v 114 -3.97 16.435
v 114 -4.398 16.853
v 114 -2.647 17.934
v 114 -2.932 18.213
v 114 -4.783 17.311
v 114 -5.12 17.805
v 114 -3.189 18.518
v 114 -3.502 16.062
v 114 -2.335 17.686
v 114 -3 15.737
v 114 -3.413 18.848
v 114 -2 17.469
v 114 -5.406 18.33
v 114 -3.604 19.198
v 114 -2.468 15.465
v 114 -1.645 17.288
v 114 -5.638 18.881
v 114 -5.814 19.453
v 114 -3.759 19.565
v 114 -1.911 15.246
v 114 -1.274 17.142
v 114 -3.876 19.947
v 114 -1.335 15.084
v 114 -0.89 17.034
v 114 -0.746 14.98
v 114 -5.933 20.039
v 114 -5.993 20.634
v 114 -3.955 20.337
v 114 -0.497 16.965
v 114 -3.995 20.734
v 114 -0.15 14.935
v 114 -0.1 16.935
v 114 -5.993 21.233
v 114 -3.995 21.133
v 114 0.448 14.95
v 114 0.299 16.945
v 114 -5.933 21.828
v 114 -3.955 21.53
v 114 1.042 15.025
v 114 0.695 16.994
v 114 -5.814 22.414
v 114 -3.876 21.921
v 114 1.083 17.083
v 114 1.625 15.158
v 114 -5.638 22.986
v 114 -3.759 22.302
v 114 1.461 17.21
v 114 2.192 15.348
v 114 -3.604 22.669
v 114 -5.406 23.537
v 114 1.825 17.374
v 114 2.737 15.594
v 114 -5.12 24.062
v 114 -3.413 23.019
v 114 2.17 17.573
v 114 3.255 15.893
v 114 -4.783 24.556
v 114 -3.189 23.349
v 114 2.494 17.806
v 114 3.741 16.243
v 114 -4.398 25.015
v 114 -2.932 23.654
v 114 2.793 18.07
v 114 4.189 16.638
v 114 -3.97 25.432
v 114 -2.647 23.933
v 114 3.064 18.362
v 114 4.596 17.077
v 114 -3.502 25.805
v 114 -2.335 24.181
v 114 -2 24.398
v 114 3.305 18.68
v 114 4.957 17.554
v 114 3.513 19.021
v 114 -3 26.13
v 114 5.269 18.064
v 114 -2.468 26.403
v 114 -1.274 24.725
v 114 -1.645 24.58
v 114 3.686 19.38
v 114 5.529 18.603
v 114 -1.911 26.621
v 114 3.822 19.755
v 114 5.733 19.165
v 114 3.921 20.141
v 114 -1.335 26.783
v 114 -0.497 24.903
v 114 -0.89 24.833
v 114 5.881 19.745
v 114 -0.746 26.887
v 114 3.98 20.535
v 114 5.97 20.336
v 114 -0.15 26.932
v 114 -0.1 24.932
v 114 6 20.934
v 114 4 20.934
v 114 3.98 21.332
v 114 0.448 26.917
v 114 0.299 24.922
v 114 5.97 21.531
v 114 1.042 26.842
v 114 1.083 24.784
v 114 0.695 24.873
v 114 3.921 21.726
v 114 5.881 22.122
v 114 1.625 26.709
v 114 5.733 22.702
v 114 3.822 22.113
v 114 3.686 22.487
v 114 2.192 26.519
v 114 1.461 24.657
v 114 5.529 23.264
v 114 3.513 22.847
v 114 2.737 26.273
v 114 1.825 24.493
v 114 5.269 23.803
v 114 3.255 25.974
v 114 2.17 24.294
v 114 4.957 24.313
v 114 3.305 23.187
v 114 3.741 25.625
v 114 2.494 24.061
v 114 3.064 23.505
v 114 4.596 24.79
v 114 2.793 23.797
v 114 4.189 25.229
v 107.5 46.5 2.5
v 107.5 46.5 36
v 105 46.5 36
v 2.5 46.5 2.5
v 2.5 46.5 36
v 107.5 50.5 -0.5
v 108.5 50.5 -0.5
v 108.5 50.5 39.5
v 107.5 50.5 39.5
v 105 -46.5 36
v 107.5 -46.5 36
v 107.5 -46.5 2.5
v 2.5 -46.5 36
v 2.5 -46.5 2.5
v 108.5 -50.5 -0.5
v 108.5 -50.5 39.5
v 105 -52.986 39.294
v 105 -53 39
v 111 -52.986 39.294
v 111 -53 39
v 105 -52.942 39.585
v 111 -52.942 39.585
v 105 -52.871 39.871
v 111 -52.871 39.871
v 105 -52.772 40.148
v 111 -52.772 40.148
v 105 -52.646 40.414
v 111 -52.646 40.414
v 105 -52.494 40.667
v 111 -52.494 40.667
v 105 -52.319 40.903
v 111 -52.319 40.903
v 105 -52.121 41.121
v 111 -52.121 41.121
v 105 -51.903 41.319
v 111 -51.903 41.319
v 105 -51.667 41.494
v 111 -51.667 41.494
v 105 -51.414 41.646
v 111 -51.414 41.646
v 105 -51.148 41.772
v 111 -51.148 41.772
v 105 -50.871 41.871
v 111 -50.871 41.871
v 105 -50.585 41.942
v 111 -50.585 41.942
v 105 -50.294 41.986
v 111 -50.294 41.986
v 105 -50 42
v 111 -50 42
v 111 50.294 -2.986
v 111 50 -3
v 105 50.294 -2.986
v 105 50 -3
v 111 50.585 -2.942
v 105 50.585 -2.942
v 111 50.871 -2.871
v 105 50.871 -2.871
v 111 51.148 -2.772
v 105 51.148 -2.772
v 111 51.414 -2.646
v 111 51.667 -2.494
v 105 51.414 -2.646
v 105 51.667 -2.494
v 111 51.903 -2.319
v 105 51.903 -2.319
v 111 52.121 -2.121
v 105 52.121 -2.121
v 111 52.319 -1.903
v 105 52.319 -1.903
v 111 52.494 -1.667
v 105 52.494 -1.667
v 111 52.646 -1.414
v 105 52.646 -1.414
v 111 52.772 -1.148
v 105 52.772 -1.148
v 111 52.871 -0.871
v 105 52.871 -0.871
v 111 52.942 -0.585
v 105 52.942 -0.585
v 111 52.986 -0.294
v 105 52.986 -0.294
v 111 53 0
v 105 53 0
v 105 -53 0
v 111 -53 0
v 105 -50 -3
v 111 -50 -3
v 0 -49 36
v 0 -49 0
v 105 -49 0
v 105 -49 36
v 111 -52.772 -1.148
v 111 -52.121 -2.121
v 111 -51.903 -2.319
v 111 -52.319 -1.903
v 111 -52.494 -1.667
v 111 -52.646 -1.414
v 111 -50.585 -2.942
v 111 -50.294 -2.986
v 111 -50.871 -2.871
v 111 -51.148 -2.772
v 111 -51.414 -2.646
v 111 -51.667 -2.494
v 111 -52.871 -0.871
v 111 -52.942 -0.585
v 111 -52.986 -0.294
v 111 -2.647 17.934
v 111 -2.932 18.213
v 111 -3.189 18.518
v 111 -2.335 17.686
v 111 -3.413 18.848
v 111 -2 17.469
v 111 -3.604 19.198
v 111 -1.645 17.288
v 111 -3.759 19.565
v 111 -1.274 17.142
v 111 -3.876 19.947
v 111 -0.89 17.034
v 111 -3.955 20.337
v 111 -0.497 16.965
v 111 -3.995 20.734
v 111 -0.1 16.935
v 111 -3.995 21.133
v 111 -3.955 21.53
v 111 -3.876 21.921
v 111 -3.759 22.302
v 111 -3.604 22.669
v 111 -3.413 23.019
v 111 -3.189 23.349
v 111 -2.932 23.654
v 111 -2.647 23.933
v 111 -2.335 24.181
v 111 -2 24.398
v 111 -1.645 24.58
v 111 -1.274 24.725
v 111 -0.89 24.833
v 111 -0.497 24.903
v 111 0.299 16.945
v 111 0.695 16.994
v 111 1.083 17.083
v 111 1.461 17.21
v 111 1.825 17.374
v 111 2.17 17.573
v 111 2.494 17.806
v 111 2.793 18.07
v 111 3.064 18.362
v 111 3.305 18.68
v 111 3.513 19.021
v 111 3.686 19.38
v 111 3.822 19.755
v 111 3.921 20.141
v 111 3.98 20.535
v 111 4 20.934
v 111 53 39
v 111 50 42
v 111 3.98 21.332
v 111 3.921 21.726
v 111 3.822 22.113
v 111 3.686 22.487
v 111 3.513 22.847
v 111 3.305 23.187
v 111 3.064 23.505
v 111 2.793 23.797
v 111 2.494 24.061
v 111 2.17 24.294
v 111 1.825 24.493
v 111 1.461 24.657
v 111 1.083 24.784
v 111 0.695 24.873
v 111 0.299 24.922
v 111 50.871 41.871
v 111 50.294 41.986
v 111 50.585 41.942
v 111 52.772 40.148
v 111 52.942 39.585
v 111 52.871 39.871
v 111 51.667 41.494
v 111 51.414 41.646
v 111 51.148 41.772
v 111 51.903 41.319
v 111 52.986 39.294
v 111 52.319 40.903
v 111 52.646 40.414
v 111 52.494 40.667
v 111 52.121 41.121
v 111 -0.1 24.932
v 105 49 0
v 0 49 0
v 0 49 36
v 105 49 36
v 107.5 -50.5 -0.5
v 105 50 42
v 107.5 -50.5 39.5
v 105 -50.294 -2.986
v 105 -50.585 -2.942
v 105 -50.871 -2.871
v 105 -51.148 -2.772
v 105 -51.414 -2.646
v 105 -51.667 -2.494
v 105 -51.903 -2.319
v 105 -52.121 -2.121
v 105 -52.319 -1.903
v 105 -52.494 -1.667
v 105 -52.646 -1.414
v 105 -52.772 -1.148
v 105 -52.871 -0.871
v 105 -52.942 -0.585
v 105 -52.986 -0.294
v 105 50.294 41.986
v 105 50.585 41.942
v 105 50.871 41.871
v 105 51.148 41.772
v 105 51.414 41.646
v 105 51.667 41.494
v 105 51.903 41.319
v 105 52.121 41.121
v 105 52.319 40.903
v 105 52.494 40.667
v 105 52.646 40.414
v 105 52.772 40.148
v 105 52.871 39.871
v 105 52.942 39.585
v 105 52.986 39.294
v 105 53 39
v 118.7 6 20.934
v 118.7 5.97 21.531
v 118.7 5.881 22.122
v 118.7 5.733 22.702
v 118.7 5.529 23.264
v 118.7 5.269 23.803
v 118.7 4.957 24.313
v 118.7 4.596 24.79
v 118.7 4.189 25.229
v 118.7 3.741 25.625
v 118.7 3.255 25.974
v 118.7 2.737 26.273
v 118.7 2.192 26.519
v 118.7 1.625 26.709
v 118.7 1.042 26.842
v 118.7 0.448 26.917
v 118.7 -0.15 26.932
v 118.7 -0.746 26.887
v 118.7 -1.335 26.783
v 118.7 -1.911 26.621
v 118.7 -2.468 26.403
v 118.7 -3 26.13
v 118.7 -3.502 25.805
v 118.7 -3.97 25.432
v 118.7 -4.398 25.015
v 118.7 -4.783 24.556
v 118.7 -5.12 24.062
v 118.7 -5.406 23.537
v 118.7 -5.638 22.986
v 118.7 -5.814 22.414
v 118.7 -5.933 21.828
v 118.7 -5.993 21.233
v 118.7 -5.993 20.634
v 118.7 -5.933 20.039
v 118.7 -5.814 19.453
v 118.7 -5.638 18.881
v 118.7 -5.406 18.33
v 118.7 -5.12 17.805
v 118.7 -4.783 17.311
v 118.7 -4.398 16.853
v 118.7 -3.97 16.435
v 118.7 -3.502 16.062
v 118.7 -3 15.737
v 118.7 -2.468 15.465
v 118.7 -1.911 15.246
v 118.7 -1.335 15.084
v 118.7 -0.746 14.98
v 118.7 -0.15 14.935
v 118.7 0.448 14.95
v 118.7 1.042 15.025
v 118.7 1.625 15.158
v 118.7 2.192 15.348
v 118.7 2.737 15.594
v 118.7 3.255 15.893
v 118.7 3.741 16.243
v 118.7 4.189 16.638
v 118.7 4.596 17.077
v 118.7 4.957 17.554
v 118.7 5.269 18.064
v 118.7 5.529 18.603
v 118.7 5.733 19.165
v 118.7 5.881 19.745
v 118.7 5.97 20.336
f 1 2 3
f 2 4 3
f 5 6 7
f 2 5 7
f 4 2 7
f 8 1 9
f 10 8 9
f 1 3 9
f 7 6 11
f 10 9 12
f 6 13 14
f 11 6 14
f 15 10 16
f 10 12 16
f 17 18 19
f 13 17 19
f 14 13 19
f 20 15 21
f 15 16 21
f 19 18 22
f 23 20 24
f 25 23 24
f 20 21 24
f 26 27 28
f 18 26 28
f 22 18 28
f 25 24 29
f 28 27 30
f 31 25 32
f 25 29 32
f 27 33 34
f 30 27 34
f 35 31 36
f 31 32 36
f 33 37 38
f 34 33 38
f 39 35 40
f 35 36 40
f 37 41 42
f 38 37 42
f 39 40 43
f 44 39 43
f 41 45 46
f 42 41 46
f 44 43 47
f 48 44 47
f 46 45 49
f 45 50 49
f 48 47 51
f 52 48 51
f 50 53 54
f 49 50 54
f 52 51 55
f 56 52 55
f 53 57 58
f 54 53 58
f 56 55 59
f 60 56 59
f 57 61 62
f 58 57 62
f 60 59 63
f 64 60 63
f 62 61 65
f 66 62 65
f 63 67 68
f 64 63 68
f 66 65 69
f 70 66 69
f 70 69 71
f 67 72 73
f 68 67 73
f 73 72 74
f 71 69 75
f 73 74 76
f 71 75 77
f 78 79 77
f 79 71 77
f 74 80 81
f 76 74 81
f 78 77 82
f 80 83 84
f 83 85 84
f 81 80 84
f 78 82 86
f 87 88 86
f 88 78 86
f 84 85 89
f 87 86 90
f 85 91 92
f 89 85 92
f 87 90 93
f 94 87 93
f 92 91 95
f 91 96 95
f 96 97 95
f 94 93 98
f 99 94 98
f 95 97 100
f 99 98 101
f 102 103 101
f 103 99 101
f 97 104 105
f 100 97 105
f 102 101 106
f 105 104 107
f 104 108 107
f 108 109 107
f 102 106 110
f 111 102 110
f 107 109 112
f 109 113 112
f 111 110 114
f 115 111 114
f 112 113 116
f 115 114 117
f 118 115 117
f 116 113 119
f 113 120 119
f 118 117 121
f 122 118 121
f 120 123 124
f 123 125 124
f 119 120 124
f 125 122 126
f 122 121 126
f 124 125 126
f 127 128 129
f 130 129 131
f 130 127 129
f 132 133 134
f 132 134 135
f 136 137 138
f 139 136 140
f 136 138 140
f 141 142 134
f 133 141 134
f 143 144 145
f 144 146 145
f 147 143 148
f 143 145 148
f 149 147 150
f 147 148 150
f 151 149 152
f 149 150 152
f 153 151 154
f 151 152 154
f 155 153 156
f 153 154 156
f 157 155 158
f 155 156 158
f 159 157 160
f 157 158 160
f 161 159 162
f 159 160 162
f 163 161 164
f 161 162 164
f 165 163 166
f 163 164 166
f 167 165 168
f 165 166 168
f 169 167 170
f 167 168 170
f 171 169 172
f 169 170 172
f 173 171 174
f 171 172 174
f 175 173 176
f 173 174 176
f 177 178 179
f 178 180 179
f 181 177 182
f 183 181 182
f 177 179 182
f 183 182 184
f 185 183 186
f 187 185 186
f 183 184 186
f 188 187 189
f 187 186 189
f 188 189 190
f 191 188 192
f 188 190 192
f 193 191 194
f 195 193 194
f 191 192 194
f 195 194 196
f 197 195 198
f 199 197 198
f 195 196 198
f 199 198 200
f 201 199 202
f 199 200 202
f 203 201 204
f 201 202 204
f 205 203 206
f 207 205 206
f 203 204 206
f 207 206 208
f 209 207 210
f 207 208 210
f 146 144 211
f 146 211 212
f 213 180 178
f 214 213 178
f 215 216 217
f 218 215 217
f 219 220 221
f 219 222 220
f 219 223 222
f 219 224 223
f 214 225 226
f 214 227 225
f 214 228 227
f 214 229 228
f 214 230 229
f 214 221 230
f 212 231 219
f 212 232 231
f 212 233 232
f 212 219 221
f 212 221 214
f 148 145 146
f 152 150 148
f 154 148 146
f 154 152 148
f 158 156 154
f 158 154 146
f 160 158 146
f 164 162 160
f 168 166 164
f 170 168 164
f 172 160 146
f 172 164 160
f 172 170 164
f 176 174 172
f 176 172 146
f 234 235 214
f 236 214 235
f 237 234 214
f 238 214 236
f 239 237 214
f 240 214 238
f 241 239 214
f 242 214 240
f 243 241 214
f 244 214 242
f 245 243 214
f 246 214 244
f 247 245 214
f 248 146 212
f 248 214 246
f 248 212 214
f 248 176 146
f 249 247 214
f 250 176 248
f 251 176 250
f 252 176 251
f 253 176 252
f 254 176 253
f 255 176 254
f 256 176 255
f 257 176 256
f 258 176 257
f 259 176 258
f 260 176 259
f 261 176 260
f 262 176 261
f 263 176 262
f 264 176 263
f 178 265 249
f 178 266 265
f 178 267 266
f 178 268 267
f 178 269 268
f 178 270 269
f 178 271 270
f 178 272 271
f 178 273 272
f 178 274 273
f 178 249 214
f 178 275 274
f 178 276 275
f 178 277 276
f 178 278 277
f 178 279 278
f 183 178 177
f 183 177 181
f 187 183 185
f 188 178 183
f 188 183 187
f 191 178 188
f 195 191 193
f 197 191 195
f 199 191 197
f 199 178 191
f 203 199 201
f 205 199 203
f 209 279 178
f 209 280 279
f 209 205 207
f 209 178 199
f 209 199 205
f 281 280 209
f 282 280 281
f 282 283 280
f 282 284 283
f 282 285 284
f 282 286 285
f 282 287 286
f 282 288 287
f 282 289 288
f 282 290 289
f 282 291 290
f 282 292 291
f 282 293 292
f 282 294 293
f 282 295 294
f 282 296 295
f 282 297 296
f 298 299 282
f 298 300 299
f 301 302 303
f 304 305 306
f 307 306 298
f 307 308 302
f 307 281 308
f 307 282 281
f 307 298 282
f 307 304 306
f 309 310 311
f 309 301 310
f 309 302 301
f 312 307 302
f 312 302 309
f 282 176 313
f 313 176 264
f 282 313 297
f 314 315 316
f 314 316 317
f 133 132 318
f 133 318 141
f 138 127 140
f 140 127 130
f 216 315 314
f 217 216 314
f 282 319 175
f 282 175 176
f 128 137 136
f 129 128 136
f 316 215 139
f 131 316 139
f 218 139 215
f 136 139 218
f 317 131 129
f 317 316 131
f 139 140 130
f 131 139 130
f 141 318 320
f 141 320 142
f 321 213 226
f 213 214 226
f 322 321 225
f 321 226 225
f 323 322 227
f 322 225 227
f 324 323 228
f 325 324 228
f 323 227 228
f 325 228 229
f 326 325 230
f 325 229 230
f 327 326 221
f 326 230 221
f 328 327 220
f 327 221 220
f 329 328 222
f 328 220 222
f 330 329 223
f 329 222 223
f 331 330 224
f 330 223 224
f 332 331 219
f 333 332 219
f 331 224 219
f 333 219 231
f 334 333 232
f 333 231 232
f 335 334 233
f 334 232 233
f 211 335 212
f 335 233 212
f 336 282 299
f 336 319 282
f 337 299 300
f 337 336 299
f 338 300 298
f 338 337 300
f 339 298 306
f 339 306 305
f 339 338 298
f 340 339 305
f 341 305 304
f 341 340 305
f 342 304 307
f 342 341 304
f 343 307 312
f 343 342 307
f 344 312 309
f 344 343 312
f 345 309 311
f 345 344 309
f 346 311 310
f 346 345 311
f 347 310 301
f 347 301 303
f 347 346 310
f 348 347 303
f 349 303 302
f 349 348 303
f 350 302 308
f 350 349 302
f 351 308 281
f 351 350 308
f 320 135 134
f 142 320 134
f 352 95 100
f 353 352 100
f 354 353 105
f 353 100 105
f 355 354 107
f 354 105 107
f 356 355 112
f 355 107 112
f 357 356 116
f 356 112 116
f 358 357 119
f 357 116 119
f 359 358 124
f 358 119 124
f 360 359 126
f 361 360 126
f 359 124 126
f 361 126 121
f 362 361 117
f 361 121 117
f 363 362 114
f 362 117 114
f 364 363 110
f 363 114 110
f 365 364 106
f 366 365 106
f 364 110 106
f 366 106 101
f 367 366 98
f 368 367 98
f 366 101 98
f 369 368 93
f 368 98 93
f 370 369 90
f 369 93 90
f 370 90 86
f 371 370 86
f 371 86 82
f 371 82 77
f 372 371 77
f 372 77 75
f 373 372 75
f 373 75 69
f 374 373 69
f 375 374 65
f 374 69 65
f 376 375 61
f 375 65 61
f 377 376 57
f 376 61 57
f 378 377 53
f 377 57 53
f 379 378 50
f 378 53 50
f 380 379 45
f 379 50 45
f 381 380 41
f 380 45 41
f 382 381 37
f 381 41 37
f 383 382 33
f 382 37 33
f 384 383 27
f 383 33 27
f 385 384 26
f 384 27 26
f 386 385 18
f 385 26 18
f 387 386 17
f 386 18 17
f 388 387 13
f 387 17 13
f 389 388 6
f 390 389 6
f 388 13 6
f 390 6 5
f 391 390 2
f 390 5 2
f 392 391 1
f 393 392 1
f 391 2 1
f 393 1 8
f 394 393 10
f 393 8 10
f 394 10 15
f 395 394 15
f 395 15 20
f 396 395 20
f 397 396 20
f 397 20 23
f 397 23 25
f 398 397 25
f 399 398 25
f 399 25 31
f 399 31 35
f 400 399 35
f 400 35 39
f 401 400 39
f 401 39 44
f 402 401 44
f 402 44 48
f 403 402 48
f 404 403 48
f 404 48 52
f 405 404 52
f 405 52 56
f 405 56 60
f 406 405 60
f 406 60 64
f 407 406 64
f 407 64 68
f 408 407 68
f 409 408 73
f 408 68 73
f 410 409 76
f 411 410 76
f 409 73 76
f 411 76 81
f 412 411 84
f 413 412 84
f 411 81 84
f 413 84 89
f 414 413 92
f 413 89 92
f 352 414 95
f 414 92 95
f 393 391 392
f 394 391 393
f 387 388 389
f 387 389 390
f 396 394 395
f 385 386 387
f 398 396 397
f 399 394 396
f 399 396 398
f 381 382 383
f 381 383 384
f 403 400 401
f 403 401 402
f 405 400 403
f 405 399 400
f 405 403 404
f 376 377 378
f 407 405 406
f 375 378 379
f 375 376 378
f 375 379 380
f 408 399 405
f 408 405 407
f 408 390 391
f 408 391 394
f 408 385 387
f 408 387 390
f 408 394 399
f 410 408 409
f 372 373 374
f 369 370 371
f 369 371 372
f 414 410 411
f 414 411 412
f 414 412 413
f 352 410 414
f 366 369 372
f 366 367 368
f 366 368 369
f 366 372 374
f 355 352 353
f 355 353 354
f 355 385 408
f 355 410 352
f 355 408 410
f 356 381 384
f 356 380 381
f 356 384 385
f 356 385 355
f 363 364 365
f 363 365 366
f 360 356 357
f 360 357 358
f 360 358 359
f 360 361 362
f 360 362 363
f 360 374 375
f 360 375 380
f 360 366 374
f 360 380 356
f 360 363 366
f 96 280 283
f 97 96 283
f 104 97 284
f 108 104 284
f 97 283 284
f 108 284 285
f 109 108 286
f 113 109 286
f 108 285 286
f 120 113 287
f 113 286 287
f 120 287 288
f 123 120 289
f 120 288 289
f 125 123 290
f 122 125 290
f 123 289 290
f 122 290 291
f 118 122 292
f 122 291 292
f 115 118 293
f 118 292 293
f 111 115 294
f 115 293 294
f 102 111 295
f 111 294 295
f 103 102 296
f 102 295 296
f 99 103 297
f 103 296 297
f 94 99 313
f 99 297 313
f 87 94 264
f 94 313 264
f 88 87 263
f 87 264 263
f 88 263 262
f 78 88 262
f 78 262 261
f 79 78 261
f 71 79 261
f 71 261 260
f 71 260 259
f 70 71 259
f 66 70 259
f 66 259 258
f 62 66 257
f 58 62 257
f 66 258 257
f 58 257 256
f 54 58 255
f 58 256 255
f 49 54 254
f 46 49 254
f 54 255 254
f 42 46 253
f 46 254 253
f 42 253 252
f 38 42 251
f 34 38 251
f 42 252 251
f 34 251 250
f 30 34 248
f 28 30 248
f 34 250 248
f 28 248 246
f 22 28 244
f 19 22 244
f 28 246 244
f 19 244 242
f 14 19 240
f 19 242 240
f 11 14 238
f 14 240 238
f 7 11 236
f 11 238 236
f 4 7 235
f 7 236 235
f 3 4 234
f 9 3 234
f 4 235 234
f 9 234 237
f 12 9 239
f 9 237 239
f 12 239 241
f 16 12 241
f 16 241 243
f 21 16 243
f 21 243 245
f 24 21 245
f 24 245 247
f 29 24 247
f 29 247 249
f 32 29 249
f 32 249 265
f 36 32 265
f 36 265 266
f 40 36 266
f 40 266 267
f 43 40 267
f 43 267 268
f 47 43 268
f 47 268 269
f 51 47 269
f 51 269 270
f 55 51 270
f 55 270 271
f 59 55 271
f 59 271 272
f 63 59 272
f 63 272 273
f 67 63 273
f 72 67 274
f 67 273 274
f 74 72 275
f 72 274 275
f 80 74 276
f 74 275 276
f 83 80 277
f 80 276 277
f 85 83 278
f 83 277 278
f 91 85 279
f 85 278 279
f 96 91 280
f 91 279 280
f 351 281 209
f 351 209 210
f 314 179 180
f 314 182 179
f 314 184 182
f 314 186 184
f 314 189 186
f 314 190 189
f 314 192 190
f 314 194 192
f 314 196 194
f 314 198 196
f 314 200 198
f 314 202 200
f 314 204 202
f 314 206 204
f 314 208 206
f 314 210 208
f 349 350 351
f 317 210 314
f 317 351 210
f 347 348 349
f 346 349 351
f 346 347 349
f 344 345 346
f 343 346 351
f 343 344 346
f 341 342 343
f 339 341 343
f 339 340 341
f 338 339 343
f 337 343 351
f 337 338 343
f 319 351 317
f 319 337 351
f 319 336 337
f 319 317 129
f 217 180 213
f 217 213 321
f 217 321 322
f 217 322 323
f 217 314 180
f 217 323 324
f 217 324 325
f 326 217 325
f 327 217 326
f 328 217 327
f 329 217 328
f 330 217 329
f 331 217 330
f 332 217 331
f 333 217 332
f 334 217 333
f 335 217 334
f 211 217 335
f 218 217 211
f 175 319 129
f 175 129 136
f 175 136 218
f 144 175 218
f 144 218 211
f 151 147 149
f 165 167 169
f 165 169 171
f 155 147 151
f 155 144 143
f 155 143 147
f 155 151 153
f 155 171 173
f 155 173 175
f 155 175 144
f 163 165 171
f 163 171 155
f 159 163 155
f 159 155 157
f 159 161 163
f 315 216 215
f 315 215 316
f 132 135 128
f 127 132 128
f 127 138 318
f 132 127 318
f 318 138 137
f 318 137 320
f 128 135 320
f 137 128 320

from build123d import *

# Parameters (mm, degrees)
F0_W        = 105
F0_H        = 98
F1_DEPTH    = 36
F2_DEPTH    = 42
F3_DEPTH    = 3
F4_T        = 2.5
F4_T3_DEPTH = 41
F4_T5_DEPTH = 103
F5_R        = 3
F6_R        = 4
F7_DEPTH    = 3
F8_R        = 6
F9_DEPTH    = 4.7


# Not quite as in the source:
# - a shell that OpenCascade refuses in one call is made with other operations: the cavity is built on its own and cut out


with BuildPart() as f1:
    # F0 (on Top) → F1 (new body)
    with BuildSketch(Plane.XY):
        with Locations((52.5, 0)):
            Rectangle(F0_W, F0_H)
    extrude(amount=F1_DEPTH)

    # F0 (on Top) → F2 (join)
    with BuildSketch(Plane.XY):
        Polygon((105, 53), (105, 49), (105, -49), (105, -53), (111, -53), (111, 53), align=None)
    extrude(amount=F2_DEPTH)

    # F0 (on Top) → F3 (join)
    with BuildSketch(Plane.XY):
        Polygon((105, 53), (105, 49), (105, -49), (105, -53), (111, -53), (111, 53), align=None)
    extrude(amount=-F3_DEPTH)

    # F4: shell of thickness 2.5, made by hand


with BuildPart() as f4_core1:
    # F4_t2: copy of F1
    add(f1.part)

    # the walls: a layer under each face that stays
    f4_faces = [f4_core1.faces().sort_by_distance(p)[0] for p in [
        (105, 45.4285714286, 38.7857142857),
        (108, 0, 42),
        (111, 0, 19.5),
        (108, 53, 19.5),
        (108, 0, -3),
        (108, -53, 19.5),
        (0, 0, 18),
        (52.5, -49, 18),
        (52.5, 0, 0),
        (52.5, 49, 18),
    ]]
    thicken(f4_faces, amount=-F4_T, mode=Mode.SUBTRACT)

    # F4_s4 → F4_t3 (cut)
    with BuildSketch(Plane.XY.offset(-2.5)):
        Polygon((104.975, 49.025), (107.5, 49), (107.5, 46.5), (105, 46.5), align=None)
        Polygon((104.975, -49.025), (107.5, -49), (107.5, -46.5), (105, -46.5), align=None)
    extrude(amount=F4_T3_DEPTH, mode=Mode.SUBTRACT)

    # F4_s6 → F4_t5 (cut)
    with BuildSketch(Plane.XZ.offset(-51.5)):
        Polygon((104.975, -0.025), (107.5, 0), (107.5, 2.5), (105, 2.5), align=None)
    extrude(amount=F4_T5_DEPTH, mode=Mode.SUBTRACT)


with BuildPart() as f1_1:
    add(f1.part)

    # what is left inside the walls is the cavity
    f4_cavity = [f4_core1.part.solids().sort_by_distance(p)[0] for p in [
        (55, -15.5, 35.975),
    ]]
    add(f4_cavity, mode=Mode.SUBTRACT)

    # F5
    f5_edges = [f1_1.edges().sort_by_distance(p)[0] for p in [
        (108, -53, 42),
        (108, 53, 42),
        (108, 53, -3),
        (108, -53, -3),
    ]]
    fillet(f5_edges, radius=F5_R)

    # F6 (on face) → F7 (join)
    with BuildSketch(Plane.YZ.offset(111)):
        with Locations((0, 20.9335461259)):
            Circle(F6_R)
    extrude(amount=F7_DEPTH)

    # F8 (on face) → F9 (join)
    with BuildSketch(Plane.YZ.offset(114)):
        with Locations((0, 20.9335461259)):
            Circle(F8_R)
    extrude(amount=F9_DEPTH)


solid = f1_1.part
